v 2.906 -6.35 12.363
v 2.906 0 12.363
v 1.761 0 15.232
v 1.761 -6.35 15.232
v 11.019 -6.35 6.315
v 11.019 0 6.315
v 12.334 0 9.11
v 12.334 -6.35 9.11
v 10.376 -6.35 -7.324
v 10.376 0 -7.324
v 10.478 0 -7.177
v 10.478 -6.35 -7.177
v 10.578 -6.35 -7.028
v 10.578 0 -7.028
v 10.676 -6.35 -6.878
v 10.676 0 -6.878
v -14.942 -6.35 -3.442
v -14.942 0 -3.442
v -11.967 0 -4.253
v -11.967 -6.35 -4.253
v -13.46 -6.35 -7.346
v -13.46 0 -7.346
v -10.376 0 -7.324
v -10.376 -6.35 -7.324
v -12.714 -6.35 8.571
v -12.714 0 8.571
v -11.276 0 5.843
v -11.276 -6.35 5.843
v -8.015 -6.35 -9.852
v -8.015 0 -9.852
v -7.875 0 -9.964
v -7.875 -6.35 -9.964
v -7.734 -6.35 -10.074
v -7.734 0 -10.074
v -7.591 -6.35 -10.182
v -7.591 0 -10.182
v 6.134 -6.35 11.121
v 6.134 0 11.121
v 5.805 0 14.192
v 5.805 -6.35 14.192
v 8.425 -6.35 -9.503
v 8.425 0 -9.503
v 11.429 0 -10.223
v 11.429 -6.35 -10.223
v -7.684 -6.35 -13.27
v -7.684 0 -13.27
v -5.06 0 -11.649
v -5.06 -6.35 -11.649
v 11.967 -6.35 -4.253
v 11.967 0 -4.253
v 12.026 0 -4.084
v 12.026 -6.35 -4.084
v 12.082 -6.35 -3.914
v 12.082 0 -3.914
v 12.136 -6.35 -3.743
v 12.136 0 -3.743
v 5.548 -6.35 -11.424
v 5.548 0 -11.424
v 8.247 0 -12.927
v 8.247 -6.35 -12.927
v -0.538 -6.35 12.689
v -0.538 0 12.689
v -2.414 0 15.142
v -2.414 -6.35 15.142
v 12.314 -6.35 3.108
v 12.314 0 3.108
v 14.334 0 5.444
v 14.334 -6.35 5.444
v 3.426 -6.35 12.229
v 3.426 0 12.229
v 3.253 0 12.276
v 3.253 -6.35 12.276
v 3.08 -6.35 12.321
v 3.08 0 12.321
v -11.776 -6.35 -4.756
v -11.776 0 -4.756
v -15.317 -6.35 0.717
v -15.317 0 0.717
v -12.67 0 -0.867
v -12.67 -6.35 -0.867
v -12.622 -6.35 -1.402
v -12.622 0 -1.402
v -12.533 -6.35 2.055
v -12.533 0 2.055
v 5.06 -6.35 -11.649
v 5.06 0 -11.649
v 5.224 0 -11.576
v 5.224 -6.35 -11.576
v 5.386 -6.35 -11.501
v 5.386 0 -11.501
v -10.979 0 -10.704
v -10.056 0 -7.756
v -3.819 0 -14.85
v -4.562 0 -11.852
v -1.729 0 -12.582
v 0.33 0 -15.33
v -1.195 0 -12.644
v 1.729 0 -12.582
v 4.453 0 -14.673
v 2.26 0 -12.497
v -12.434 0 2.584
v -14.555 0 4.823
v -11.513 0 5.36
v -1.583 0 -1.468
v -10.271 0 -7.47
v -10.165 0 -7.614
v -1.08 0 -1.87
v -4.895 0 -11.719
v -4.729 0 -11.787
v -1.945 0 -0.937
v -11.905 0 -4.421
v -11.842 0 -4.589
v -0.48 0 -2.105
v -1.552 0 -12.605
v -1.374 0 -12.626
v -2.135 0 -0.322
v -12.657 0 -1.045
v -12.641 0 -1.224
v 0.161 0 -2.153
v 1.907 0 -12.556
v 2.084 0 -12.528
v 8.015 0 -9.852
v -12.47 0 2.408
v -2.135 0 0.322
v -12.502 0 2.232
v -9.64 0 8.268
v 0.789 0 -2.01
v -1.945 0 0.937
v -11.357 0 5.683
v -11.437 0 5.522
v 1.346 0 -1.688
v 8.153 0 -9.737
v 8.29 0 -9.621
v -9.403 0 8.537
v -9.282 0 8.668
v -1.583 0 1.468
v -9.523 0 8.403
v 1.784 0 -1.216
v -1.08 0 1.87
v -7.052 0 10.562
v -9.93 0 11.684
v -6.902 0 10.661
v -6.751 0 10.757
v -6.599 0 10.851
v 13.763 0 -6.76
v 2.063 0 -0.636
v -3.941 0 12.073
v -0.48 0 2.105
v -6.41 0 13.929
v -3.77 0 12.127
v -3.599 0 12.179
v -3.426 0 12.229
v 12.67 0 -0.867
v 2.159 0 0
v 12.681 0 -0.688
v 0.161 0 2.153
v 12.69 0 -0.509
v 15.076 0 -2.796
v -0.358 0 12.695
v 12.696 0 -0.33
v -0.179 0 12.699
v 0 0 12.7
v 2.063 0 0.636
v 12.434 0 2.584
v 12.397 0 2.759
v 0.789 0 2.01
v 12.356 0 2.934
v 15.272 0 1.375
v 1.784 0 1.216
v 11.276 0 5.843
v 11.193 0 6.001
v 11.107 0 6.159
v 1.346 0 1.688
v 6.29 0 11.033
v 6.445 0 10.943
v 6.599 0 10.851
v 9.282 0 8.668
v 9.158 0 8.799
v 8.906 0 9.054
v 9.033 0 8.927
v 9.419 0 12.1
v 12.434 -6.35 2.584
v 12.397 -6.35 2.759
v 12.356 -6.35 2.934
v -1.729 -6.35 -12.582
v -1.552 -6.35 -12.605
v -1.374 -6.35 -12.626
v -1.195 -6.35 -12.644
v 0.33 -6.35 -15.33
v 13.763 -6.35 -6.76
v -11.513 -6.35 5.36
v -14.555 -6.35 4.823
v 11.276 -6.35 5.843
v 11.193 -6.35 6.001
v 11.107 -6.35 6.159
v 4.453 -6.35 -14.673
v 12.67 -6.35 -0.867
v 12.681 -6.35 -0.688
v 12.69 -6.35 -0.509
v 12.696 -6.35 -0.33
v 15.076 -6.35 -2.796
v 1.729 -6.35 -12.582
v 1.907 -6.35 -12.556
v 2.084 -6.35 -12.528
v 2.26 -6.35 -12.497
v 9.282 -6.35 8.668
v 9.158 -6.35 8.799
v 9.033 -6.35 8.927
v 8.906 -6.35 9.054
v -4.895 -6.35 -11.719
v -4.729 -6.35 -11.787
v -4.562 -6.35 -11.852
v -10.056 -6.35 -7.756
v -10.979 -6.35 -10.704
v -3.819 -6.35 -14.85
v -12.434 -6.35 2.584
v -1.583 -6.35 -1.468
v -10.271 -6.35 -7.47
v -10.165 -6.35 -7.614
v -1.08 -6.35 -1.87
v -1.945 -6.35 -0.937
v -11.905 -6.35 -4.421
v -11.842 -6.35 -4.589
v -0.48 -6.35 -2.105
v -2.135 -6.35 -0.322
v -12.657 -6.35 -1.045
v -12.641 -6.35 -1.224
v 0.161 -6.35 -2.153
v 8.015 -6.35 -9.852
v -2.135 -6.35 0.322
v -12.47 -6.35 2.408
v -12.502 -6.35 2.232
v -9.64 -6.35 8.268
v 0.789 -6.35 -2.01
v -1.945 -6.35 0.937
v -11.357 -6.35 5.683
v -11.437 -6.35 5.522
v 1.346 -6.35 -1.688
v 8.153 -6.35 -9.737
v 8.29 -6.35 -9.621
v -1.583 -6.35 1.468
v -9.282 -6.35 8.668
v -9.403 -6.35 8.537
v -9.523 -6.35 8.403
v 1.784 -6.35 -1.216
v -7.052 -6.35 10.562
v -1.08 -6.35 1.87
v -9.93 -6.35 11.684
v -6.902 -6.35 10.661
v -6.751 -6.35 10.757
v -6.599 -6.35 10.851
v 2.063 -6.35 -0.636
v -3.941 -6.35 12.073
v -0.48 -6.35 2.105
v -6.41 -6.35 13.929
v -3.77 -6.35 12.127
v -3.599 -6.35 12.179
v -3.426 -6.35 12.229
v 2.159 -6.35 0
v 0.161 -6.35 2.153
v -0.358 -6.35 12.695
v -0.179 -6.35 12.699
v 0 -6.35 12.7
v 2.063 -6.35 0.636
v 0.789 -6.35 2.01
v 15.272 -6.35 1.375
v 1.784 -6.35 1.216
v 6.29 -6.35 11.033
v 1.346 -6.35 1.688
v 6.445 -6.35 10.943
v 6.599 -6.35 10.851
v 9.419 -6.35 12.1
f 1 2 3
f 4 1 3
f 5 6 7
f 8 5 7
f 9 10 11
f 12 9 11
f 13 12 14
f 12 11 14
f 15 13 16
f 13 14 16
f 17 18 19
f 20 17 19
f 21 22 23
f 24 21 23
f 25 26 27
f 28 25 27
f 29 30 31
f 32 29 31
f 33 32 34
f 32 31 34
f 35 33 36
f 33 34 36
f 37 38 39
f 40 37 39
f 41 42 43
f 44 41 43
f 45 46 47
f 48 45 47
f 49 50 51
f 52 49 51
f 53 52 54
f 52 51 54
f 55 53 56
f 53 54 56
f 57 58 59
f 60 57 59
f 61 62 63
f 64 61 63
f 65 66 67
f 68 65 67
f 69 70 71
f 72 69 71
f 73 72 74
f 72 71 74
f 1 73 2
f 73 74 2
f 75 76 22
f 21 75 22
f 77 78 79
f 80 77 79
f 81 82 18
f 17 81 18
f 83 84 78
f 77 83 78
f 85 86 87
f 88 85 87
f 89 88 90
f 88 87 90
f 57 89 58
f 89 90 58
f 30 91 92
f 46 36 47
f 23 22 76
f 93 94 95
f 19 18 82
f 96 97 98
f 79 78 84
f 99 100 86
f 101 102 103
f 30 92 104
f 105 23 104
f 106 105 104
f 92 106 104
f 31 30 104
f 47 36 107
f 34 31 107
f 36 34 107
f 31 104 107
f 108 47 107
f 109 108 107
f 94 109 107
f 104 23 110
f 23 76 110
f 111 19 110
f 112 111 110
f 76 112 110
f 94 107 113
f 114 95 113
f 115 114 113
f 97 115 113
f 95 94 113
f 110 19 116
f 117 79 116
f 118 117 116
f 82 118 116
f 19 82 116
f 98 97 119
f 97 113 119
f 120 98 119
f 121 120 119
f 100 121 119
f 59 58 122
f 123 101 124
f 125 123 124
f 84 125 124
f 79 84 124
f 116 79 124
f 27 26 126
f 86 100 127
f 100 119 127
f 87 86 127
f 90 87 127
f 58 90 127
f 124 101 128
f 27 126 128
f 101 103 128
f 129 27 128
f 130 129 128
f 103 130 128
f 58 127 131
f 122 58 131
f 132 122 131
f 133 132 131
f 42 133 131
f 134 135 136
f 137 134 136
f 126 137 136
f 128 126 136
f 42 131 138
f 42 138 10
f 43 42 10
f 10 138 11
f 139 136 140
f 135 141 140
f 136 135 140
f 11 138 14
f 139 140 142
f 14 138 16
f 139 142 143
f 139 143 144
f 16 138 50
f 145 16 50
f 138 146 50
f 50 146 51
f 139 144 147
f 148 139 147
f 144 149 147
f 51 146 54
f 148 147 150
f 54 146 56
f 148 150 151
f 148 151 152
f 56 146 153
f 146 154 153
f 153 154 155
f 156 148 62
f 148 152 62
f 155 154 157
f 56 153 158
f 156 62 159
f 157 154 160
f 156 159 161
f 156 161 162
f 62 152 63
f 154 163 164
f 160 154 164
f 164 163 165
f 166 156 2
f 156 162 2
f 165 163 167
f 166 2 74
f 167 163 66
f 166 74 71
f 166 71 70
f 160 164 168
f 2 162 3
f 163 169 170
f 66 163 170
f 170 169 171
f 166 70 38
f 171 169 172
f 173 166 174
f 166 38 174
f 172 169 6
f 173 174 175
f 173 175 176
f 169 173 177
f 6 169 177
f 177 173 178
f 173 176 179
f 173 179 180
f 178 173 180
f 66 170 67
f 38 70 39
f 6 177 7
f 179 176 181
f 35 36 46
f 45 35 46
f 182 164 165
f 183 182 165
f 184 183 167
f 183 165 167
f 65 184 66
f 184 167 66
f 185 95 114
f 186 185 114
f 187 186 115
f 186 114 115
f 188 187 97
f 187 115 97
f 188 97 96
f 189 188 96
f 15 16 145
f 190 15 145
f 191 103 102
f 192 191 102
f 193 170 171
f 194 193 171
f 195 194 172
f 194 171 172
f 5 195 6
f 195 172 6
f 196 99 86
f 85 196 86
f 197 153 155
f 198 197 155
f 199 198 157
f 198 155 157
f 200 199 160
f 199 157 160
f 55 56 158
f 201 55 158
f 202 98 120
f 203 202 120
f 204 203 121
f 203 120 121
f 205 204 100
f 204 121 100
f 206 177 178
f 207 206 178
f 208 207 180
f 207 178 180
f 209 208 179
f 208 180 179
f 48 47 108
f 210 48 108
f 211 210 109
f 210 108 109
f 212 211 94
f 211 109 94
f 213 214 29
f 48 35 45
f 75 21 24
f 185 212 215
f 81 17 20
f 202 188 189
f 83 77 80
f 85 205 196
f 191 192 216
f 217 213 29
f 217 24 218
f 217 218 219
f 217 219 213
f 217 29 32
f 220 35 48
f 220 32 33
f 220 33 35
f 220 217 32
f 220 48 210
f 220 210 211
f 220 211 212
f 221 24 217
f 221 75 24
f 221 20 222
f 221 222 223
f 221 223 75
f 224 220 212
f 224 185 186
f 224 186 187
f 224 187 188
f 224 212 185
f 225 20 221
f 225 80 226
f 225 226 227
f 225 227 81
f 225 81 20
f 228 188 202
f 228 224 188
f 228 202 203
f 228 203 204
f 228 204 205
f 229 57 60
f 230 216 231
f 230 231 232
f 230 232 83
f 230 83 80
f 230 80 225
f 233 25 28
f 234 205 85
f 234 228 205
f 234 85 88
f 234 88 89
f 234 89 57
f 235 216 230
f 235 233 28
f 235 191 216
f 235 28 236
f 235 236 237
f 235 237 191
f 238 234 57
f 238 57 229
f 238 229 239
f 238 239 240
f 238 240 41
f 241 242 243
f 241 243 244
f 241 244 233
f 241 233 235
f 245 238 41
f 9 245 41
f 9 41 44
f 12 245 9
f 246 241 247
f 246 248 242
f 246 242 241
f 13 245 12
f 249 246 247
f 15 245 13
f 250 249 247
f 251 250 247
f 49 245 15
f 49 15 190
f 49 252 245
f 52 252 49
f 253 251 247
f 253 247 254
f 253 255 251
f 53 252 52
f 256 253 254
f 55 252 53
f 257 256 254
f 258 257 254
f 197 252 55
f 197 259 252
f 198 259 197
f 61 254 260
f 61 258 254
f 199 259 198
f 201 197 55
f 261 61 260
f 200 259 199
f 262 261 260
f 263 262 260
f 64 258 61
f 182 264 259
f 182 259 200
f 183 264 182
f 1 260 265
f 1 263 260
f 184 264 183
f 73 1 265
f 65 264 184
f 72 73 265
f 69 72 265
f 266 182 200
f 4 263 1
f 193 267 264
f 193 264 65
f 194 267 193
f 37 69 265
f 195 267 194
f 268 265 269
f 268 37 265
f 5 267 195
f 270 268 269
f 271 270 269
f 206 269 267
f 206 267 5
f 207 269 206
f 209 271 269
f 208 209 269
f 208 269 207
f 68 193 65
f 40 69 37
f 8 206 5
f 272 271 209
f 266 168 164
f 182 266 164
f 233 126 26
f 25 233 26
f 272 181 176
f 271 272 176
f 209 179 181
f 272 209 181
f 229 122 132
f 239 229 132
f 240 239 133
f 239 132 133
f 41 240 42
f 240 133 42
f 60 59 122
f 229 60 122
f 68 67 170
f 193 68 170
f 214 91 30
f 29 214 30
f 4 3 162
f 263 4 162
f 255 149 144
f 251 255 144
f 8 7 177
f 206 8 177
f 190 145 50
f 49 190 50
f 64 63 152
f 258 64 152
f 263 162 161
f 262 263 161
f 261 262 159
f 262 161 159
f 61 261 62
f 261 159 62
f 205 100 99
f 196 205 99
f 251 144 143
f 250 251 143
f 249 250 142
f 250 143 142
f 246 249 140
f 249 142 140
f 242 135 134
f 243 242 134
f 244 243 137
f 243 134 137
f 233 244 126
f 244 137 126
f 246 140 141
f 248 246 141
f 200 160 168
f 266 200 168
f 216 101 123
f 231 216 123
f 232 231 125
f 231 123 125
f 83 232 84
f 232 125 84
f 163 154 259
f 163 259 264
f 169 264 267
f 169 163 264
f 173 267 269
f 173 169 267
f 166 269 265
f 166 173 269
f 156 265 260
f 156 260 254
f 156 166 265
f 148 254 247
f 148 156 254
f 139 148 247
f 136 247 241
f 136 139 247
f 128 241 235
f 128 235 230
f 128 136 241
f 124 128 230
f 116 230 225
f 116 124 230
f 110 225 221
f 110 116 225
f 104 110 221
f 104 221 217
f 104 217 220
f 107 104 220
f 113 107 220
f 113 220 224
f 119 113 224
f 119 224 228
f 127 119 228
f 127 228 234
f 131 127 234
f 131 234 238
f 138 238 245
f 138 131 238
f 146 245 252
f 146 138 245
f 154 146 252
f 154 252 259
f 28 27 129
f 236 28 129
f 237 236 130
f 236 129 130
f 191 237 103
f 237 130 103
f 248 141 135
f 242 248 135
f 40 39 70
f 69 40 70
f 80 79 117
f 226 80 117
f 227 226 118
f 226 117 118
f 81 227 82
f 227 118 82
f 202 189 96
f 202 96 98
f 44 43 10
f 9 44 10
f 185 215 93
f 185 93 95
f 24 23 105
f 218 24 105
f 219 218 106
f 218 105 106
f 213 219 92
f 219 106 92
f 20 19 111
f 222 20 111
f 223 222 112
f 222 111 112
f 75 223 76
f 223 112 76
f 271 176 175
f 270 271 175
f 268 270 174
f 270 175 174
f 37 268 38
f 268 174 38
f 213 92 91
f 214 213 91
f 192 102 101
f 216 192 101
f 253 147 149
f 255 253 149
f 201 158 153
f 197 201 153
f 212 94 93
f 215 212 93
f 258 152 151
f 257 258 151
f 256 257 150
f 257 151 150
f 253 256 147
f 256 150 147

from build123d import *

# Parameters (mm, degrees)
F0_R     = 2.159
F1_DEPTH = 6.35


with BuildPart() as f1:
    # F0 (on Front) → F1 (new body)
    with BuildSketch(Plane.XZ):
        with BuildLine():
            ThreePointArc((12.695722, -0.329596), (12.698931, -0.164812), (12.7, 0))
            ThreePointArc((12.7, 0), (12.633417, 1.298755), (12.434368, 2.583891))
            ThreePointArc((12.434368, 2.583891), (12.376885, 2.846529), (12.313854, 3.107891))
            ThreePointArc((12.313854, 3.107891), (11.874003, 4.505335), (11.276142, 5.842826))
            ThreePointArc((11.276142, 5.842826), (11.149932, 6.080216), (11.018724, 6.31488))
            ThreePointArc((11.018724, 6.31488), (10.218158, 7.541833), (9.281617, 8.668425))
            ThreePointArc((9.281617, 8.668425), (9.09604, 8.86296), (8.906386, 9.053524))
            ThreePointArc((8.906386, 9.053524), (7.804479, 10.018987), (6.598716, 10.851126))
            ThreePointArc((6.598716, 10.851126), (6.367536, 10.98838), (6.133501, 11.120709))
            ThreePointArc((6.133501, 11.120709), (4.811977, 11.753079), (3.426419, 12.22905))
            ThreePointArc((3.426419, 12.22905), (3.166781, 12.298841), (2.905723, 12.363121))
            ThreePointArc((2.905723, 12.363121), (1.462593, 12.615499), (0, 12.7))
            ThreePointArc((0, 12.7), (-0.26884, 12.697154), (-0.537559, 12.688618))
            ThreePointArc((-0.537559, 12.688618), (-1.995265, 12.542285), (-3.426419, 12.22905))
            ThreePointArc((-3.426419, 12.22905), (-3.684522, 12.153777), (-3.940973, 12.073058))
            ThreePointArc((-3.940973, 12.073058), (-5.305143, 11.538867), (-6.598716, 10.851126))
            ThreePointArc((-6.598716, 10.851126), (-6.826939, 10.70901), (-7.052103, 10.562095))
            ThreePointArc((-7.052103, 10.562095), (-8.221563, 9.679664), (-9.281617, 8.668425))
            ThreePointArc((-9.281617, 8.668425), (-9.463034, 8.470005), (-9.640211, 8.267789))
            ThreePointArc((-9.640211, 8.267789), (-10.528227, 7.102565), (-11.276142, 5.842826))
            ThreePointArc((-11.276142, 5.842826), (-11.397299, 5.602818), (-11.513349, 5.360299))
            ThreePointArc((-11.513349, 5.360299), (-12.054061, 3.998701), (-12.434368, 2.583891))
            ThreePointArc((-12.434368, 2.583891), (-12.486279, 2.320096), (-12.532594, 2.05526))
            ThreePointArc((-12.532594, 2.05526), (-12.6859, 0.598271), (-12.670393, -0.866679))
            ThreePointArc((-12.670393, -0.866679), (-12.649208, -1.134697), (-12.622354, -1.402208))
            ThreePointArc((-12.622354, -1.402208), (-12.376885, -2.846529), (-11.966714, -4.252971))
            ThreePointArc((-11.966714, -4.252971), (-11.874003, -4.505335), (-11.775971, -4.75568))
            ThreePointArc((-11.775971, -4.75568), (-11.149932, -6.080216), (-10.375518, -7.32384))
            ThreePointArc((-10.375518, -7.32384), (-10.218158, -7.541833), (-10.056219, -7.756446))
            ThreePointArc((-10.056219, -7.756446), (-9.09604, -8.86296), (-8.014817, -9.851533))
            ThreePointArc((-8.014817, -9.851533), (-7.804479, -10.018987), (-7.590643, -10.181951))
            ThreePointArc((-7.590643, -10.181951), (-6.367536, -10.98838), (-5.059694, -11.648584))
            ThreePointArc((-5.059694, -11.648584), (-4.811977, -11.753079), (-4.562104, -11.852308))
            ThreePointArc((-4.562104, -11.852308), (-3.166781, -12.298841), (-1.729316, -12.581712))
            ThreePointArc((-1.729316, -12.581712), (-1.462593, -12.615499), (-1.195214, -12.643633))
            ThreePointArc((-1.195214, -12.643633), (0.26884, -12.697154), (1.729316, -12.581712))
            ThreePointArc((1.729316, -12.581712), (1.995265, -12.542285), (2.260319, -12.497238))
            ThreePointArc((2.260319, -12.497238), (3.684522, -12.153777), (5.059694, -11.648584))
            ThreePointArc((5.059694, -11.648584), (5.305143, -11.538867), (5.548215, -11.42398))
            ThreePointArc((5.548215, -11.42398), (6.826939, -10.70901), (8.014817, -9.851533))
            ThreePointArc((8.014817, -9.851533), (8.221563, -9.679664), (8.424625, -9.503457))
            ThreePointArc((8.424625, -9.503457), (9.463034, -8.470005), (10.375518, -7.32384))
            ThreePointArc((10.375518, -7.32384), (10.528227, -7.102565), (10.676219, -6.878107))
            ThreePointArc((10.676219, -6.878107), (11.397299, -5.602818), (11.966714, -4.252971))
            ThreePointArc((11.966714, -4.252971), (12.054061, -3.998701), (12.136007, -3.742639))
            ThreePointArc((12.136007, -3.742639), (12.486279, -2.320096), (12.670393, -0.866679))
            ThreePointArc((12.670393, -0.866679), (12.6859, -0.598271), (12.695722, -0.329596))
        make_face()
        Circle(F0_R, mode=Mode.SUBTRACT)
        with BuildLine():
            ThreePointArc((-12.670393, -0.866679), (-12.6859, 0.598271), (-12.532594, 2.05526))
            Line((-12.532594, 2.05526), (-15.316746, 0.717239))
            Line((-15.316746, 0.717239), (-12.670393, -0.866679))
        make_face()
        with BuildLine():
            ThreePointArc((-12.434368, 2.583891), (-12.054061, 3.998701), (-11.513349, 5.360299))
            Line((-11.513349, 5.360299), (-14.555251, 4.82305))
            Line((-14.555251, 4.82305), (-12.434368, 2.583891))
        make_face()
        with BuildLine():
            ThreePointArc((-11.276142, 5.842826), (-10.528227, 7.102565), (-9.640211, 8.267789))
            Line((-9.640211, 8.267789), (-12.714259, 8.571158))
            Line((-12.714259, 8.571158), (-11.276142, 5.842826))
        make_face()
        with BuildLine():
            ThreePointArc((-9.281617, 8.668425), (-8.221563, 9.679664), (-7.052103, 10.562095))
            Line((-7.052103, 10.562095), (-9.930309, 11.683582))
            Line((-9.930309, 11.683582), (-9.281617, 8.668425))
        make_face()
        with BuildLine():
            ThreePointArc((-6.598716, 10.851126), (-5.305143, 11.538867), (-3.940973, 12.073058))
            Line((-3.940973, 12.073058), (-6.409874, 13.929489))
            Line((-6.409874, 13.929489), (-6.598716, 10.851126))
        make_face()
        with BuildLine():
            ThreePointArc((-3.426419, 12.22905), (-1.995265, 12.542285), (-0.537559, 12.688618))
            Line((-0.537559, 12.688618), (-2.414047, 15.142308))
            Line((-2.414047, 15.142308), (-3.426419, 12.22905))
        make_face()
        with BuildLine():
            ThreePointArc((0, 12.7), (1.462593, 12.615499), (2.905723, 12.363121))
            Line((2.905723, 12.363121), (1.760818, 15.232093))
            Line((1.760818, 15.232093), (0, 12.7))
        make_face()
        with BuildLine():
            ThreePointArc((3.426419, 12.22905), (4.811977, 11.753079), (6.133501, 11.120709))
            Line((6.133501, 11.120709), (5.805092, 14.192182))
            Line((5.805092, 14.192182), (3.426419, 12.22905))
        make_face()
        with BuildLine():
            ThreePointArc((6.598716, 10.851126), (7.804479, 10.018987), (8.906386, 9.053524))
            Line((8.906386, 9.053524), (9.418828, 12.099703))
            Line((9.418828, 12.099703), (6.598716, 10.851126))
        make_face()
        with BuildLine():
            ThreePointArc((9.281617, 8.668425), (10.218158, 7.541833), (11.018724, 6.31488))
            Line((11.018724, 6.31488), (12.334013, 9.109843))
            Line((12.334013, 9.109843), (9.281617, 8.668425))
        make_face()
        with BuildLine():
            ThreePointArc((11.276142, 5.842826), (11.874003, 4.505335), (12.313854, 3.107891))
            Line((12.313854, 3.107891), (14.334441, 5.444349))
            Line((14.334441, 5.444349), (11.276142, 5.842826))
        make_face()
        with BuildLine():
            ThreePointArc((12.434368, 2.583891), (12.633417, 1.298755), (12.7, 0))
            ThreePointArc((12.7, 0), (12.698931, -0.164812), (12.695722, -0.329596))
            Line((12.695722, -0.329596), (15.271749, 1.375072))
            Line((15.271749, 1.375072), (12.434368, 2.583891))
        make_face()
        with BuildLine():
            Line((15.076421, -2.796188), (12.670393, -0.866679))
            ThreePointArc((12.670393, -0.866679), (12.486279, -2.320096), (12.136007, -3.742639))
            Line((12.136007, -3.742639), (15.076421, -2.796188))
        make_face()
        with BuildLine():
            Line((13.762944, -6.760068), (11.966714, -4.252971))
            ThreePointArc((11.966714, -4.252971), (11.397299, -5.602818), (10.676219, -6.878107))
            Line((10.676219, -6.878107), (13.762944, -6.760068))
        make_face()
        with BuildLine():
            Line((11.428732, -10.222584), (10.375518, -7.32384))
            ThreePointArc((10.375518, -7.32384), (9.463034, -8.470005), (8.424625, -9.503457))
            Line((8.424625, -9.503457), (11.428732, -10.222584))
        make_face()
        with BuildLine():
            Line((8.246903, -12.926937), (8.014817, -9.851533))
            ThreePointArc((8.014817, -9.851533), (6.826939, -10.70901), (5.548215, -11.42398))
            Line((5.548215, -11.42398), (8.246903, -12.926937))
        make_face()
        with BuildLine():
            Line((4.45344, -14.672559), (5.059694, -11.648584))
            ThreePointArc((5.059694, -11.648584), (3.684522, -12.153777), (2.260319, -12.497238))
            Line((2.260319, -12.497238), (4.45344, -14.672559))
        make_face()
        with BuildLine():
            Line((0.329685, -15.329985), (1.729316, -12.581712))
            ThreePointArc((1.729316, -12.581712), (0.26884, -12.697154), (-1.195214, -12.643633))
            Line((-1.195214, -12.643633), (0.329685, -15.329985))
        make_face()
        with BuildLine():
            Line((-3.818521, -14.850455), (-1.729316, -12.581712))
            ThreePointArc((-1.729316, -12.581712), (-3.166781, -12.298841), (-4.562104, -11.852308))
            Line((-4.562104, -11.852308), (-3.818521, -14.850455))
        make_face()
        with BuildLine():
            Line((-7.683525, -13.269536), (-5.059694, -11.648584))
            ThreePointArc((-5.059694, -11.648584), (-6.367536, -10.98838), (-7.590643, -10.181951))
            Line((-7.590643, -10.181951), (-7.683525, -13.269536))
        make_face()
        with BuildLine():
            Line((-10.978677, -10.704475), (-8.014817, -9.851533))
            ThreePointArc((-8.014817, -9.851533), (-9.09604, -8.86296), (-10.056219, -7.756446))
            Line((-10.056219, -7.756446), (-10.978677, -10.704475))
        make_face()
        with BuildLine():
            Line((-13.45959, -7.345513), (-10.375518, -7.32384))
            ThreePointArc((-10.375518, -7.32384), (-11.149932, -6.080216), (-11.775971, -4.75568))
            Line((-11.775971, -4.75568), (-13.45959, -7.345513))
        make_face()
        with BuildLine():
            Line((-14.942268, -3.441767), (-11.966714, -4.252971))
            ThreePointArc((-11.966714, -4.252971), (-12.376885, -2.846529), (-12.622354, -1.402208))
            Line((-12.622354, -1.402208), (-14.942268, -3.441767))
        make_face()
    extrude(amount=F1_DEPTH)


solid = f1.part
